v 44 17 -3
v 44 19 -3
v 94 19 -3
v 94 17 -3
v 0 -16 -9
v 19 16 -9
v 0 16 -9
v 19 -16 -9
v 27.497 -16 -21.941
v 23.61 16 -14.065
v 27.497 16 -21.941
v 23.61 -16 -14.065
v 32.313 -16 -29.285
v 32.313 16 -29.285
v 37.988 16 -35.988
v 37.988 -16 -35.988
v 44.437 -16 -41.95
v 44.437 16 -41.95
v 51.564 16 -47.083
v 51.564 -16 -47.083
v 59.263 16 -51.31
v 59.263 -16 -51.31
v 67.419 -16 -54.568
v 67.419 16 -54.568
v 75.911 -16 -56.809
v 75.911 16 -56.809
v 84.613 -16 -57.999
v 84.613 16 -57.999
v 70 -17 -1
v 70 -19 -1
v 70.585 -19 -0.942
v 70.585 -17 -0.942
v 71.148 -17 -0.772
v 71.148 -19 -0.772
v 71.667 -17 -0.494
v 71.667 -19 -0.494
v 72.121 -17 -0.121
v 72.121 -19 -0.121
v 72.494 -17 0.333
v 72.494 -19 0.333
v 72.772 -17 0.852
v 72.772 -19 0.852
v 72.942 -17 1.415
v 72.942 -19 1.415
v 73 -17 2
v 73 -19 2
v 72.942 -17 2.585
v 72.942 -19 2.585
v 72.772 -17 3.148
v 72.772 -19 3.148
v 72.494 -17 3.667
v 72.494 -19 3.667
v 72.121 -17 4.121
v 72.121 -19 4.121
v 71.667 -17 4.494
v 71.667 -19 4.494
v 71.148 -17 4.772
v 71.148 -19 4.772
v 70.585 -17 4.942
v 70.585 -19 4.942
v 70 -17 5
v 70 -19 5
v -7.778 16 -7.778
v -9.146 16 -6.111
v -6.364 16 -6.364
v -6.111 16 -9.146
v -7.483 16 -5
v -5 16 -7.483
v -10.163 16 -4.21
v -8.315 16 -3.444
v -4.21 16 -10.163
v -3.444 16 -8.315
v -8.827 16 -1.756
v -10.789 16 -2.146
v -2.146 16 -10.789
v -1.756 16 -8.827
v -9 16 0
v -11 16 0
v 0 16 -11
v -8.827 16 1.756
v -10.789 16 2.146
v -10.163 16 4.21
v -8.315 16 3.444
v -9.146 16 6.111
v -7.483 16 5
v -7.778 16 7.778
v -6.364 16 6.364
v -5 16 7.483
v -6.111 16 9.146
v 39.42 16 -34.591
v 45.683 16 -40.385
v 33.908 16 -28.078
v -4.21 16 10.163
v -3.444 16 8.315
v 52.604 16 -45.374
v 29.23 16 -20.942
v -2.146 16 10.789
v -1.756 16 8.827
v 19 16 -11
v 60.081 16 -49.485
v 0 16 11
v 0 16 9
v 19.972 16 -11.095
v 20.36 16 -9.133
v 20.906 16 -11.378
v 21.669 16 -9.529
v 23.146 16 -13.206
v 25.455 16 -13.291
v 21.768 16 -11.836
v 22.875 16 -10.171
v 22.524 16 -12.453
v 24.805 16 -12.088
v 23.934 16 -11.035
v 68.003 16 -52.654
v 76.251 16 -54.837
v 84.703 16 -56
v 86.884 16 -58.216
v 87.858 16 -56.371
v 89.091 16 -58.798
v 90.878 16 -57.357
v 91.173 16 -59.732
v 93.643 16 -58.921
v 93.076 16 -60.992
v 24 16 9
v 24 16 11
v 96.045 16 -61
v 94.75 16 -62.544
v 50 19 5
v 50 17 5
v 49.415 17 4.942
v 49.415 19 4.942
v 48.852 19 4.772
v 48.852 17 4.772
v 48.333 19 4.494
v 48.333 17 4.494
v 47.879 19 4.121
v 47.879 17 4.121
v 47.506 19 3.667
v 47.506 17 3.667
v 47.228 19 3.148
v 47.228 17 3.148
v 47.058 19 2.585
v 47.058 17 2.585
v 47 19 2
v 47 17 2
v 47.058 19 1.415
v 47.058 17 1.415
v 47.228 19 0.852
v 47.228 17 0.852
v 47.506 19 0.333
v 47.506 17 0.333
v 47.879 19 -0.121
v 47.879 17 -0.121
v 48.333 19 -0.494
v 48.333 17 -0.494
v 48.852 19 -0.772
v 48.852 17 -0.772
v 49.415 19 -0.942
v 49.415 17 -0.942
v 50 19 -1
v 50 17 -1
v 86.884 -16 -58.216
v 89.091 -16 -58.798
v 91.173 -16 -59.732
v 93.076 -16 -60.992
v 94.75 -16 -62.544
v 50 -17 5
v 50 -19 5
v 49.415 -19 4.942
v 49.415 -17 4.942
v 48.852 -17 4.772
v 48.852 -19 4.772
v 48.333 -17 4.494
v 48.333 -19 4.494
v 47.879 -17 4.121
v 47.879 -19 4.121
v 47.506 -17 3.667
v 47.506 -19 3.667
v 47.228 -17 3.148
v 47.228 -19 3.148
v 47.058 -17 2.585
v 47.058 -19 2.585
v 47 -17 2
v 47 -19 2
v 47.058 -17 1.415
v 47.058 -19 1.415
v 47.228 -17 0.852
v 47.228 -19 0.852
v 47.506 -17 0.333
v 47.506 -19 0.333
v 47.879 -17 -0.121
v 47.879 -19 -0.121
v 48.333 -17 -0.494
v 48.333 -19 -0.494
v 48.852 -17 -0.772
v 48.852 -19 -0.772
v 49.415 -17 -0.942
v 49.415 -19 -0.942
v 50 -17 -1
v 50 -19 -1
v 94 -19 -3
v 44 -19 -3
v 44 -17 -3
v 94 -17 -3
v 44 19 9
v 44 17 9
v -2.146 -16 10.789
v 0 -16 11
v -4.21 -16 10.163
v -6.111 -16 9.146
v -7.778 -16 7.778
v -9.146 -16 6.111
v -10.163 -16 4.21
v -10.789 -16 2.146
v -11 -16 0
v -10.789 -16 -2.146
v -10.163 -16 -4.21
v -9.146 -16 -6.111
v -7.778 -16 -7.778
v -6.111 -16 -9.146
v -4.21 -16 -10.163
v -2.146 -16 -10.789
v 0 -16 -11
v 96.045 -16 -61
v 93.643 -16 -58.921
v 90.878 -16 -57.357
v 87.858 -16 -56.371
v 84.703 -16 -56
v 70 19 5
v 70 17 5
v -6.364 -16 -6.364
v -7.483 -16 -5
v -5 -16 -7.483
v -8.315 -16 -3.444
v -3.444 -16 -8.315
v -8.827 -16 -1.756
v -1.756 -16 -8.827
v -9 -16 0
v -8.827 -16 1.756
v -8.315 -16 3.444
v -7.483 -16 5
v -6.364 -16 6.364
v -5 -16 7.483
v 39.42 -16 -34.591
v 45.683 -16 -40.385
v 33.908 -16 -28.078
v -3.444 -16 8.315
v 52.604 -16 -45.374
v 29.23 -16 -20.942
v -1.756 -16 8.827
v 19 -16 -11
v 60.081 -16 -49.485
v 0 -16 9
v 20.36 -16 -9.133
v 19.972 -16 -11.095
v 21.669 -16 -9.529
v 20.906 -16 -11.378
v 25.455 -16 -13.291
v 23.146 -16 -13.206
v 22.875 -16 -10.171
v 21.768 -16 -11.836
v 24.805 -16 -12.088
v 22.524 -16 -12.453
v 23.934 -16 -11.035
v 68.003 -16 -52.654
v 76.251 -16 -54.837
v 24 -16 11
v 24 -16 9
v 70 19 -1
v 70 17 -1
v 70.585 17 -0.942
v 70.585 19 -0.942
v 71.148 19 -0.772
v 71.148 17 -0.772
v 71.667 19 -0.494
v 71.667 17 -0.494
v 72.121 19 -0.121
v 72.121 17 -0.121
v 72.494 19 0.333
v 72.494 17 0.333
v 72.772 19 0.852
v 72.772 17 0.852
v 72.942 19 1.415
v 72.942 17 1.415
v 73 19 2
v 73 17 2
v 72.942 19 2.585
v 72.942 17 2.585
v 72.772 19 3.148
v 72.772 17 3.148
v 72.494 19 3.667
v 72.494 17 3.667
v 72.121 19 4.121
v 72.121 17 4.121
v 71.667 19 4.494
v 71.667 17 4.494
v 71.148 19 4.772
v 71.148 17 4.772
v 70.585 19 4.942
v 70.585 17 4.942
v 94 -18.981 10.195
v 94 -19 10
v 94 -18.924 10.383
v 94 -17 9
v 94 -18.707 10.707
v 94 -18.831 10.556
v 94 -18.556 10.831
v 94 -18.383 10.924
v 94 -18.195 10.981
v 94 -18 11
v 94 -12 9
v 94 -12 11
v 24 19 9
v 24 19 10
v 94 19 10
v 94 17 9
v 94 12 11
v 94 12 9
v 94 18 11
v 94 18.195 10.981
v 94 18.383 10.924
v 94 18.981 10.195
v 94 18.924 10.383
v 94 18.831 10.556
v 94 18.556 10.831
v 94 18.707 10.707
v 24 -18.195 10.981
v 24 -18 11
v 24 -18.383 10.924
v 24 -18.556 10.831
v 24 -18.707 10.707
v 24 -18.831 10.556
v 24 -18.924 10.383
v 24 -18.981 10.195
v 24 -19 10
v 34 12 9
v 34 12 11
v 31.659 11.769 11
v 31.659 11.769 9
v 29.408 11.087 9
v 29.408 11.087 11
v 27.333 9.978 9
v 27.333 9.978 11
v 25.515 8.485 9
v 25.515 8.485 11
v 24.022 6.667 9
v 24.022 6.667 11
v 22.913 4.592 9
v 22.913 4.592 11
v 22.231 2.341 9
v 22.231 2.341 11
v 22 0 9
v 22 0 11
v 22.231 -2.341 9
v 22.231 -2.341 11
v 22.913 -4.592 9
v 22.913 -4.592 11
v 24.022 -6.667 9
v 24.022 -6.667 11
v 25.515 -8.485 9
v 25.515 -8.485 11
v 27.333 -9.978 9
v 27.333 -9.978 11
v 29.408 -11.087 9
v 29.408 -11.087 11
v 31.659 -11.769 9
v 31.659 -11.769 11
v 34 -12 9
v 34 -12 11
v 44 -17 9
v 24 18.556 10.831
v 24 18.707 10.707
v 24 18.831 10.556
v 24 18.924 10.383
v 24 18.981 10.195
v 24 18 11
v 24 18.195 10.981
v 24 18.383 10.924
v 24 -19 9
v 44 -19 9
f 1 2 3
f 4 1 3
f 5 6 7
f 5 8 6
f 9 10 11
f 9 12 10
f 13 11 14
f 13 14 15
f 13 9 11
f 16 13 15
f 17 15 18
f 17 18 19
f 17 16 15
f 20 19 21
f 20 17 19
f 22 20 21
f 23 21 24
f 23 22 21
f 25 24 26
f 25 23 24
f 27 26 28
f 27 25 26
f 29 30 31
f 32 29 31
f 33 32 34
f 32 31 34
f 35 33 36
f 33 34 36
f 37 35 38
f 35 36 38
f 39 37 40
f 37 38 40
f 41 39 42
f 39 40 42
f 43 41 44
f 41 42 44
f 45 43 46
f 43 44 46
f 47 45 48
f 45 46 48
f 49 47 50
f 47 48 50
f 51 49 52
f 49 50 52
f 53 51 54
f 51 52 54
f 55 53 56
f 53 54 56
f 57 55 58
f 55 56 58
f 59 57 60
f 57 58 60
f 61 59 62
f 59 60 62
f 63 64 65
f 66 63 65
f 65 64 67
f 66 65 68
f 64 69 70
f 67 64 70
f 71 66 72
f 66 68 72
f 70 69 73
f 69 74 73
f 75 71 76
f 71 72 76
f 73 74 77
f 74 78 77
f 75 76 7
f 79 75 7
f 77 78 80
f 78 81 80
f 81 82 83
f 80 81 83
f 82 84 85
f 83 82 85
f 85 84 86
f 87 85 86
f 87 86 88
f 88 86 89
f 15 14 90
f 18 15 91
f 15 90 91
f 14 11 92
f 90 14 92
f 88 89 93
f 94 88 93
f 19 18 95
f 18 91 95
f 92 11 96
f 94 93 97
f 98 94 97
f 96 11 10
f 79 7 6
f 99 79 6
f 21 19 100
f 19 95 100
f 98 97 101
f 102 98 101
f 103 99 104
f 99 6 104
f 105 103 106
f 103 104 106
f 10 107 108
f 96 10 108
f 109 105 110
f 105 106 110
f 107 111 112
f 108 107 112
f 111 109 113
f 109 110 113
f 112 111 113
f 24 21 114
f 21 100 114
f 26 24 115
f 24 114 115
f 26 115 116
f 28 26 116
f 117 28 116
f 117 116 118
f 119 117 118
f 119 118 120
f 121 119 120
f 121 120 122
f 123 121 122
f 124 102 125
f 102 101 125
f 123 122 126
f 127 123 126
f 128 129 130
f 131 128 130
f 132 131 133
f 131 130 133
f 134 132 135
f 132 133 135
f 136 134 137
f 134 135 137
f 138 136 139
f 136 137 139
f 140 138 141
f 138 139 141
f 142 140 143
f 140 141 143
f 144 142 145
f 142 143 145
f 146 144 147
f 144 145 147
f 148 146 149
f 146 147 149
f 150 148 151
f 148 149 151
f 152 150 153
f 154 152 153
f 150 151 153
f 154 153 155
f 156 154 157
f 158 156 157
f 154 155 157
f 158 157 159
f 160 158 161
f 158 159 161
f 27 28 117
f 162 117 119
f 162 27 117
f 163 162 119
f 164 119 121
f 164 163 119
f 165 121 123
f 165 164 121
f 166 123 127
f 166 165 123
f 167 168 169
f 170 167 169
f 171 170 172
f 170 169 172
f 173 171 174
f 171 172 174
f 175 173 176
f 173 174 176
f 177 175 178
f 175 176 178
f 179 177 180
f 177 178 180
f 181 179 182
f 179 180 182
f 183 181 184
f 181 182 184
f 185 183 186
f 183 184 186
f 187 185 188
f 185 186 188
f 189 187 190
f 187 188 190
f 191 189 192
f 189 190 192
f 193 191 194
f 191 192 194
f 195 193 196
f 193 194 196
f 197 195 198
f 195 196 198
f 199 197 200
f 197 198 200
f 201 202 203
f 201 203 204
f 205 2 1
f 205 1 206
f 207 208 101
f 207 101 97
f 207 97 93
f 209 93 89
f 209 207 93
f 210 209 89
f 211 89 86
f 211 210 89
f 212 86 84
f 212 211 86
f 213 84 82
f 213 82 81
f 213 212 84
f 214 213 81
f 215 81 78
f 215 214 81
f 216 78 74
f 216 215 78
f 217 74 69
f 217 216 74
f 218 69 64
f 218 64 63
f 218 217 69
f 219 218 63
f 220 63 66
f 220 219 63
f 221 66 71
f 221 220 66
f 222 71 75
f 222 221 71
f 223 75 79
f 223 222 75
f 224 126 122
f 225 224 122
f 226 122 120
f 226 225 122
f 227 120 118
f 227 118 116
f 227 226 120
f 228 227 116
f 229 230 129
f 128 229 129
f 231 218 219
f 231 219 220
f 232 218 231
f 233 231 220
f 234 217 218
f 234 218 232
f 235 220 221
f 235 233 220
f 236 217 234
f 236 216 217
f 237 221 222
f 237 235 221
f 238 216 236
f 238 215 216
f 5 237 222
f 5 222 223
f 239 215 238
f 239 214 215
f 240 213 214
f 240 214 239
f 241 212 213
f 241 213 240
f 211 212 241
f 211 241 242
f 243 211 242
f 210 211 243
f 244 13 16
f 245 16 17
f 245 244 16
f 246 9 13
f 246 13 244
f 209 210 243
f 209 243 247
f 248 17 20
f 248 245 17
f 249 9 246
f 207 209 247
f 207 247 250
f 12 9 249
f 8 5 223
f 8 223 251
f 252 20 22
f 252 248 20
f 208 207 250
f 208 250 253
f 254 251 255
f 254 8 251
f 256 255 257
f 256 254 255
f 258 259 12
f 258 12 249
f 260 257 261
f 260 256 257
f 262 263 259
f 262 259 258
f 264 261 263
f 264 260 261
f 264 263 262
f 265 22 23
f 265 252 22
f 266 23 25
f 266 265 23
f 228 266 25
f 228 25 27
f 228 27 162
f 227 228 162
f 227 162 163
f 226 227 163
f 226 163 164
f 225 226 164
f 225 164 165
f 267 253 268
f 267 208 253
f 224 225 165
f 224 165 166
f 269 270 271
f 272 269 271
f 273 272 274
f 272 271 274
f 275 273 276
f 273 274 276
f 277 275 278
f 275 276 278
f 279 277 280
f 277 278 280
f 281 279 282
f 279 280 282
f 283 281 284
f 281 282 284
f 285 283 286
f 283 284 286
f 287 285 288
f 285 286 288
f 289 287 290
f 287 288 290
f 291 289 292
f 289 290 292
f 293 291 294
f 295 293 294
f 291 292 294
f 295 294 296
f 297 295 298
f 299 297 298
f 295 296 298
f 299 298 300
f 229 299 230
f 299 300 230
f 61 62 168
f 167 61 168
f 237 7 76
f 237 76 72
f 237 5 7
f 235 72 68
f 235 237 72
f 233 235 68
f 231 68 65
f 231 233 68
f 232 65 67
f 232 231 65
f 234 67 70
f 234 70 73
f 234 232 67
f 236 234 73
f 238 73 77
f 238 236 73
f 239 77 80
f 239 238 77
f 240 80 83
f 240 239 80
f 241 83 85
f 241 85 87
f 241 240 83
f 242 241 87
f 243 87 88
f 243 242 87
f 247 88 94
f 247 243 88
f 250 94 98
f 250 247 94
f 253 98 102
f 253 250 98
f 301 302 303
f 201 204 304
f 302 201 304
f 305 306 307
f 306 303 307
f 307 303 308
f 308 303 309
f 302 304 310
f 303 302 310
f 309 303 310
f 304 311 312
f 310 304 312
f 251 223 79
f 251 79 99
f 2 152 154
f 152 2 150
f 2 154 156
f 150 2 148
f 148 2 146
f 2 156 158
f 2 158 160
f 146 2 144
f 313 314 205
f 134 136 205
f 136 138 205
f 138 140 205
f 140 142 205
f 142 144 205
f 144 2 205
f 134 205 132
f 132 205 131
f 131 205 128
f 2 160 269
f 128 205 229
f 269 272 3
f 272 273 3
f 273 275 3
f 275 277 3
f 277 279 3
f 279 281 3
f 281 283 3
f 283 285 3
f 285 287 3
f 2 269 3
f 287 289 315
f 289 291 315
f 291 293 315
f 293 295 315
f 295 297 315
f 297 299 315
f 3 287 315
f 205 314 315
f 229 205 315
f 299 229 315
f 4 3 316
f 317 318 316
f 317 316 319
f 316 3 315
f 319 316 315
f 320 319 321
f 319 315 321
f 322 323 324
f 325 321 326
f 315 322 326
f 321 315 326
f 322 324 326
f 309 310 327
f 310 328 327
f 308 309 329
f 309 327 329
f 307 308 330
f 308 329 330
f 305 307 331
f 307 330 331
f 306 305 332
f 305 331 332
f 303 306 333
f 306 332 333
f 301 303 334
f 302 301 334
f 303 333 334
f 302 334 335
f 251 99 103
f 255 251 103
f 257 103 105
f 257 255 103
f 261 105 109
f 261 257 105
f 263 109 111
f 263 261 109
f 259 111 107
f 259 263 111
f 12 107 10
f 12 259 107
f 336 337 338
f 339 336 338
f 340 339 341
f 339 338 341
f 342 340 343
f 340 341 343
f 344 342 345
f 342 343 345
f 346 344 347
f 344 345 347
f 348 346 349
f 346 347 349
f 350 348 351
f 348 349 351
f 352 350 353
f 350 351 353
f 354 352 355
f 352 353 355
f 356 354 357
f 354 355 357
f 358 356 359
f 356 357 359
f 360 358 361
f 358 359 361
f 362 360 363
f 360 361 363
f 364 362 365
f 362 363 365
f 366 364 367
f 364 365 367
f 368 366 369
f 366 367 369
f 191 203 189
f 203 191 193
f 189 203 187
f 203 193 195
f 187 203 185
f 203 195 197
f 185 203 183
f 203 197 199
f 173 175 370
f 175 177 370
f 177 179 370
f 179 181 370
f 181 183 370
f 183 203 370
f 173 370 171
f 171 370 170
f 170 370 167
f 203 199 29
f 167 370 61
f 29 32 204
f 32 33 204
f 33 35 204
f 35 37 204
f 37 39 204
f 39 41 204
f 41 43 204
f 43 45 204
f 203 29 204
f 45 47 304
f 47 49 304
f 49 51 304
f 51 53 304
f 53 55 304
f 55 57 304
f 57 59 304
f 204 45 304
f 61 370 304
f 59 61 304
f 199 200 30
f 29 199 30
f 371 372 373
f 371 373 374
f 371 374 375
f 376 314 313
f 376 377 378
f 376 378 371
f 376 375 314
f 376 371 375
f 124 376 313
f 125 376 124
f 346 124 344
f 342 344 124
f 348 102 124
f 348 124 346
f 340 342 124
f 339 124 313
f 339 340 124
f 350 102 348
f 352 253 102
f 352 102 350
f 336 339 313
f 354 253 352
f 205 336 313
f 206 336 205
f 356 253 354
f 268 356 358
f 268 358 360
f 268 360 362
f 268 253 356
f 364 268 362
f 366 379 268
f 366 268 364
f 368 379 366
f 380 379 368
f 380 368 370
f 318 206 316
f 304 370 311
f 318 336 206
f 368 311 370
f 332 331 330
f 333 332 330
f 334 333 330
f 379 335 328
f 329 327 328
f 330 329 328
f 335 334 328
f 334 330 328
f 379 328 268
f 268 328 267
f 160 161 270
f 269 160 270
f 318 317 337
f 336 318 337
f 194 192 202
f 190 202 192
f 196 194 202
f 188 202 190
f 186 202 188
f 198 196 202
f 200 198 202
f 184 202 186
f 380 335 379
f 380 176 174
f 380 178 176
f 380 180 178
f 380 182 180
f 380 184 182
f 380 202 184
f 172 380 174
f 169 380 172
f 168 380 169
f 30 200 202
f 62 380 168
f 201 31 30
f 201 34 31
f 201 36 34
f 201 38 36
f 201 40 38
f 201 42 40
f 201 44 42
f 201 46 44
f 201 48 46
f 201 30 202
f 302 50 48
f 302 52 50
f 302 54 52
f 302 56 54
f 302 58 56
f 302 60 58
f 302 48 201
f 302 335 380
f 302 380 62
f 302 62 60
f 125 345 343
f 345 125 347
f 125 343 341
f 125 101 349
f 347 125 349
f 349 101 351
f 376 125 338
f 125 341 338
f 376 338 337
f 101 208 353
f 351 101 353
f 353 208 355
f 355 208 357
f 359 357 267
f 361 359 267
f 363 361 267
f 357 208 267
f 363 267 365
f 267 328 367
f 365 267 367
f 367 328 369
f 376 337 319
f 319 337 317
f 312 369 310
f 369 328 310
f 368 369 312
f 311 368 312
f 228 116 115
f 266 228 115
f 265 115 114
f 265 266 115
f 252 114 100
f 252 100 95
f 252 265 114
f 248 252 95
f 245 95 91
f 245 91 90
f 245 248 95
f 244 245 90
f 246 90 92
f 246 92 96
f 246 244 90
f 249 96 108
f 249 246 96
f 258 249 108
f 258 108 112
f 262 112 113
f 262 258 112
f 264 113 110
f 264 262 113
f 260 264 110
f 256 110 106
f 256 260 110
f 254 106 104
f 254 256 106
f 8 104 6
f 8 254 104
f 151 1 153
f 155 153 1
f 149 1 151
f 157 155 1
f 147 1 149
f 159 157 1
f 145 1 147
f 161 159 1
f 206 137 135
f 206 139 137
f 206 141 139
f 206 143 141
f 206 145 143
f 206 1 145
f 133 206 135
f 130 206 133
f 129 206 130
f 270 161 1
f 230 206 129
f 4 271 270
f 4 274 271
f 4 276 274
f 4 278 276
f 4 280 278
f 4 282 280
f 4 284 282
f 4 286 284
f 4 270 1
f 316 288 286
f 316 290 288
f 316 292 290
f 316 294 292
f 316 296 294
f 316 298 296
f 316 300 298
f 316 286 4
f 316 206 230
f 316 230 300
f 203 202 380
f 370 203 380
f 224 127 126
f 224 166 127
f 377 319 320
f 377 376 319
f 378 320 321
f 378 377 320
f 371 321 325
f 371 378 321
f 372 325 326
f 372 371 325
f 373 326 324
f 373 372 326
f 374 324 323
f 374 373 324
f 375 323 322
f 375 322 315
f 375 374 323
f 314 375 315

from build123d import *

# Parameters (mm, degrees)
F1_DEPTH  = 16
F2_W      = 70
F2_H      = 3
F3_DEPTH  = 2
F4_W      = 50
F4_H      = 14
F5_DEPTH  = 2
F6_R      = 1
F9_DEPTH  = 2
F11_DEPTH = 38.001


with BuildPart() as f1:
    # F0 (on Front) → F1 (new body)
    with BuildSketch(Plane.XZ):
        with BuildLine():
            Line((94, 11), (0, 11))
            ThreePointArc((0, 11), (-11, 0), (0, -11))
            Line((0, -11), (19, -11))
            ThreePointArc((19, -11), (21.768112, -11.836161), (23.61039, -14.064979))
            ThreePointArc((23.61039, -14.064979), (47.922303, -44.625558), (84.612543, -57.998828))
            ThreePointArc((84.612543, -57.998828), (90.151136, -59.22276), (94.749536, -62.543715))
            Line((94.749536, -62.543715), (96.044866, -61))
            ThreePointArc((96.044866, -61), (90.877978, -57.357164), (84.703426, -56))
            ThreePointArc((84.703426, -56), (49.067219, -42.985418), (25.454545, -13.29097))
            ThreePointArc((25.454545, -13.29097), (22.875357, -10.170626), (19, -9))
            Line((19, -9), (0, -9))
            ThreePointArc((0, -9), (-9, 0), (0, 9))
            Line((0, 9), (94, 9))
            Line((94, 9), (94, 11))
        make_face()
    extrude(amount=F1_DEPTH)

    # F2 (on face) → F3 (join)
    with BuildSketch(Plane.XY.offset(11)):
        with Locations((59, -17.5)):
            Rectangle(F2_W, F2_H)
    extrude(amount=-F3_DEPTH)

    # F4 (on face) → F5 (join)
    with BuildSketch(Plane.XZ.offset(19)):
        with Locations((69, 4)):
            Rectangle(F4_W, F4_H)
    extrude(amount=-F5_DEPTH)

    # F6
    f6_edges = [f1.edges().sort_by_distance(p)[0] for p in [
        (59, -19, 11),
    ]]
    fillet(f6_edges, radius=F6_R)

    # F7: F1 across plane


with BuildPart() as f1_1:
    add(f1.part)
    add(f1.part.mirror(Plane.XZ))

    # F8 (on face) → F9 (cut)
    with BuildSketch(Plane.XY.offset(11)):
        with BuildLine():
            Line((94, 12), (34, 12))
            ThreePointArc((34, 12), (22, 0), (34, -12))
            Line((34, -12), (94, -12))
            Line((94, -12), (94, 12))
        make_face()
    extrude(amount=-F9_DEPTH, mode=Mode.SUBTRACT)

    # F10 (on face) → F11 (cut, through all)
    with BuildSketch(Plane.XZ.offset(19)):
        with BuildLine():
            ThreePointArc((50, 5), (47, 2), (50, -1))
            Line((50, -1), (70, -1))
            ThreePointArc((70, -1), (73, 2), (70, 5))
            Line((70, 5), (50, 5))
        make_face()
    extrude(amount=-F11_DEPTH, mode=Mode.SUBTRACT)


solid = f1_1.part
